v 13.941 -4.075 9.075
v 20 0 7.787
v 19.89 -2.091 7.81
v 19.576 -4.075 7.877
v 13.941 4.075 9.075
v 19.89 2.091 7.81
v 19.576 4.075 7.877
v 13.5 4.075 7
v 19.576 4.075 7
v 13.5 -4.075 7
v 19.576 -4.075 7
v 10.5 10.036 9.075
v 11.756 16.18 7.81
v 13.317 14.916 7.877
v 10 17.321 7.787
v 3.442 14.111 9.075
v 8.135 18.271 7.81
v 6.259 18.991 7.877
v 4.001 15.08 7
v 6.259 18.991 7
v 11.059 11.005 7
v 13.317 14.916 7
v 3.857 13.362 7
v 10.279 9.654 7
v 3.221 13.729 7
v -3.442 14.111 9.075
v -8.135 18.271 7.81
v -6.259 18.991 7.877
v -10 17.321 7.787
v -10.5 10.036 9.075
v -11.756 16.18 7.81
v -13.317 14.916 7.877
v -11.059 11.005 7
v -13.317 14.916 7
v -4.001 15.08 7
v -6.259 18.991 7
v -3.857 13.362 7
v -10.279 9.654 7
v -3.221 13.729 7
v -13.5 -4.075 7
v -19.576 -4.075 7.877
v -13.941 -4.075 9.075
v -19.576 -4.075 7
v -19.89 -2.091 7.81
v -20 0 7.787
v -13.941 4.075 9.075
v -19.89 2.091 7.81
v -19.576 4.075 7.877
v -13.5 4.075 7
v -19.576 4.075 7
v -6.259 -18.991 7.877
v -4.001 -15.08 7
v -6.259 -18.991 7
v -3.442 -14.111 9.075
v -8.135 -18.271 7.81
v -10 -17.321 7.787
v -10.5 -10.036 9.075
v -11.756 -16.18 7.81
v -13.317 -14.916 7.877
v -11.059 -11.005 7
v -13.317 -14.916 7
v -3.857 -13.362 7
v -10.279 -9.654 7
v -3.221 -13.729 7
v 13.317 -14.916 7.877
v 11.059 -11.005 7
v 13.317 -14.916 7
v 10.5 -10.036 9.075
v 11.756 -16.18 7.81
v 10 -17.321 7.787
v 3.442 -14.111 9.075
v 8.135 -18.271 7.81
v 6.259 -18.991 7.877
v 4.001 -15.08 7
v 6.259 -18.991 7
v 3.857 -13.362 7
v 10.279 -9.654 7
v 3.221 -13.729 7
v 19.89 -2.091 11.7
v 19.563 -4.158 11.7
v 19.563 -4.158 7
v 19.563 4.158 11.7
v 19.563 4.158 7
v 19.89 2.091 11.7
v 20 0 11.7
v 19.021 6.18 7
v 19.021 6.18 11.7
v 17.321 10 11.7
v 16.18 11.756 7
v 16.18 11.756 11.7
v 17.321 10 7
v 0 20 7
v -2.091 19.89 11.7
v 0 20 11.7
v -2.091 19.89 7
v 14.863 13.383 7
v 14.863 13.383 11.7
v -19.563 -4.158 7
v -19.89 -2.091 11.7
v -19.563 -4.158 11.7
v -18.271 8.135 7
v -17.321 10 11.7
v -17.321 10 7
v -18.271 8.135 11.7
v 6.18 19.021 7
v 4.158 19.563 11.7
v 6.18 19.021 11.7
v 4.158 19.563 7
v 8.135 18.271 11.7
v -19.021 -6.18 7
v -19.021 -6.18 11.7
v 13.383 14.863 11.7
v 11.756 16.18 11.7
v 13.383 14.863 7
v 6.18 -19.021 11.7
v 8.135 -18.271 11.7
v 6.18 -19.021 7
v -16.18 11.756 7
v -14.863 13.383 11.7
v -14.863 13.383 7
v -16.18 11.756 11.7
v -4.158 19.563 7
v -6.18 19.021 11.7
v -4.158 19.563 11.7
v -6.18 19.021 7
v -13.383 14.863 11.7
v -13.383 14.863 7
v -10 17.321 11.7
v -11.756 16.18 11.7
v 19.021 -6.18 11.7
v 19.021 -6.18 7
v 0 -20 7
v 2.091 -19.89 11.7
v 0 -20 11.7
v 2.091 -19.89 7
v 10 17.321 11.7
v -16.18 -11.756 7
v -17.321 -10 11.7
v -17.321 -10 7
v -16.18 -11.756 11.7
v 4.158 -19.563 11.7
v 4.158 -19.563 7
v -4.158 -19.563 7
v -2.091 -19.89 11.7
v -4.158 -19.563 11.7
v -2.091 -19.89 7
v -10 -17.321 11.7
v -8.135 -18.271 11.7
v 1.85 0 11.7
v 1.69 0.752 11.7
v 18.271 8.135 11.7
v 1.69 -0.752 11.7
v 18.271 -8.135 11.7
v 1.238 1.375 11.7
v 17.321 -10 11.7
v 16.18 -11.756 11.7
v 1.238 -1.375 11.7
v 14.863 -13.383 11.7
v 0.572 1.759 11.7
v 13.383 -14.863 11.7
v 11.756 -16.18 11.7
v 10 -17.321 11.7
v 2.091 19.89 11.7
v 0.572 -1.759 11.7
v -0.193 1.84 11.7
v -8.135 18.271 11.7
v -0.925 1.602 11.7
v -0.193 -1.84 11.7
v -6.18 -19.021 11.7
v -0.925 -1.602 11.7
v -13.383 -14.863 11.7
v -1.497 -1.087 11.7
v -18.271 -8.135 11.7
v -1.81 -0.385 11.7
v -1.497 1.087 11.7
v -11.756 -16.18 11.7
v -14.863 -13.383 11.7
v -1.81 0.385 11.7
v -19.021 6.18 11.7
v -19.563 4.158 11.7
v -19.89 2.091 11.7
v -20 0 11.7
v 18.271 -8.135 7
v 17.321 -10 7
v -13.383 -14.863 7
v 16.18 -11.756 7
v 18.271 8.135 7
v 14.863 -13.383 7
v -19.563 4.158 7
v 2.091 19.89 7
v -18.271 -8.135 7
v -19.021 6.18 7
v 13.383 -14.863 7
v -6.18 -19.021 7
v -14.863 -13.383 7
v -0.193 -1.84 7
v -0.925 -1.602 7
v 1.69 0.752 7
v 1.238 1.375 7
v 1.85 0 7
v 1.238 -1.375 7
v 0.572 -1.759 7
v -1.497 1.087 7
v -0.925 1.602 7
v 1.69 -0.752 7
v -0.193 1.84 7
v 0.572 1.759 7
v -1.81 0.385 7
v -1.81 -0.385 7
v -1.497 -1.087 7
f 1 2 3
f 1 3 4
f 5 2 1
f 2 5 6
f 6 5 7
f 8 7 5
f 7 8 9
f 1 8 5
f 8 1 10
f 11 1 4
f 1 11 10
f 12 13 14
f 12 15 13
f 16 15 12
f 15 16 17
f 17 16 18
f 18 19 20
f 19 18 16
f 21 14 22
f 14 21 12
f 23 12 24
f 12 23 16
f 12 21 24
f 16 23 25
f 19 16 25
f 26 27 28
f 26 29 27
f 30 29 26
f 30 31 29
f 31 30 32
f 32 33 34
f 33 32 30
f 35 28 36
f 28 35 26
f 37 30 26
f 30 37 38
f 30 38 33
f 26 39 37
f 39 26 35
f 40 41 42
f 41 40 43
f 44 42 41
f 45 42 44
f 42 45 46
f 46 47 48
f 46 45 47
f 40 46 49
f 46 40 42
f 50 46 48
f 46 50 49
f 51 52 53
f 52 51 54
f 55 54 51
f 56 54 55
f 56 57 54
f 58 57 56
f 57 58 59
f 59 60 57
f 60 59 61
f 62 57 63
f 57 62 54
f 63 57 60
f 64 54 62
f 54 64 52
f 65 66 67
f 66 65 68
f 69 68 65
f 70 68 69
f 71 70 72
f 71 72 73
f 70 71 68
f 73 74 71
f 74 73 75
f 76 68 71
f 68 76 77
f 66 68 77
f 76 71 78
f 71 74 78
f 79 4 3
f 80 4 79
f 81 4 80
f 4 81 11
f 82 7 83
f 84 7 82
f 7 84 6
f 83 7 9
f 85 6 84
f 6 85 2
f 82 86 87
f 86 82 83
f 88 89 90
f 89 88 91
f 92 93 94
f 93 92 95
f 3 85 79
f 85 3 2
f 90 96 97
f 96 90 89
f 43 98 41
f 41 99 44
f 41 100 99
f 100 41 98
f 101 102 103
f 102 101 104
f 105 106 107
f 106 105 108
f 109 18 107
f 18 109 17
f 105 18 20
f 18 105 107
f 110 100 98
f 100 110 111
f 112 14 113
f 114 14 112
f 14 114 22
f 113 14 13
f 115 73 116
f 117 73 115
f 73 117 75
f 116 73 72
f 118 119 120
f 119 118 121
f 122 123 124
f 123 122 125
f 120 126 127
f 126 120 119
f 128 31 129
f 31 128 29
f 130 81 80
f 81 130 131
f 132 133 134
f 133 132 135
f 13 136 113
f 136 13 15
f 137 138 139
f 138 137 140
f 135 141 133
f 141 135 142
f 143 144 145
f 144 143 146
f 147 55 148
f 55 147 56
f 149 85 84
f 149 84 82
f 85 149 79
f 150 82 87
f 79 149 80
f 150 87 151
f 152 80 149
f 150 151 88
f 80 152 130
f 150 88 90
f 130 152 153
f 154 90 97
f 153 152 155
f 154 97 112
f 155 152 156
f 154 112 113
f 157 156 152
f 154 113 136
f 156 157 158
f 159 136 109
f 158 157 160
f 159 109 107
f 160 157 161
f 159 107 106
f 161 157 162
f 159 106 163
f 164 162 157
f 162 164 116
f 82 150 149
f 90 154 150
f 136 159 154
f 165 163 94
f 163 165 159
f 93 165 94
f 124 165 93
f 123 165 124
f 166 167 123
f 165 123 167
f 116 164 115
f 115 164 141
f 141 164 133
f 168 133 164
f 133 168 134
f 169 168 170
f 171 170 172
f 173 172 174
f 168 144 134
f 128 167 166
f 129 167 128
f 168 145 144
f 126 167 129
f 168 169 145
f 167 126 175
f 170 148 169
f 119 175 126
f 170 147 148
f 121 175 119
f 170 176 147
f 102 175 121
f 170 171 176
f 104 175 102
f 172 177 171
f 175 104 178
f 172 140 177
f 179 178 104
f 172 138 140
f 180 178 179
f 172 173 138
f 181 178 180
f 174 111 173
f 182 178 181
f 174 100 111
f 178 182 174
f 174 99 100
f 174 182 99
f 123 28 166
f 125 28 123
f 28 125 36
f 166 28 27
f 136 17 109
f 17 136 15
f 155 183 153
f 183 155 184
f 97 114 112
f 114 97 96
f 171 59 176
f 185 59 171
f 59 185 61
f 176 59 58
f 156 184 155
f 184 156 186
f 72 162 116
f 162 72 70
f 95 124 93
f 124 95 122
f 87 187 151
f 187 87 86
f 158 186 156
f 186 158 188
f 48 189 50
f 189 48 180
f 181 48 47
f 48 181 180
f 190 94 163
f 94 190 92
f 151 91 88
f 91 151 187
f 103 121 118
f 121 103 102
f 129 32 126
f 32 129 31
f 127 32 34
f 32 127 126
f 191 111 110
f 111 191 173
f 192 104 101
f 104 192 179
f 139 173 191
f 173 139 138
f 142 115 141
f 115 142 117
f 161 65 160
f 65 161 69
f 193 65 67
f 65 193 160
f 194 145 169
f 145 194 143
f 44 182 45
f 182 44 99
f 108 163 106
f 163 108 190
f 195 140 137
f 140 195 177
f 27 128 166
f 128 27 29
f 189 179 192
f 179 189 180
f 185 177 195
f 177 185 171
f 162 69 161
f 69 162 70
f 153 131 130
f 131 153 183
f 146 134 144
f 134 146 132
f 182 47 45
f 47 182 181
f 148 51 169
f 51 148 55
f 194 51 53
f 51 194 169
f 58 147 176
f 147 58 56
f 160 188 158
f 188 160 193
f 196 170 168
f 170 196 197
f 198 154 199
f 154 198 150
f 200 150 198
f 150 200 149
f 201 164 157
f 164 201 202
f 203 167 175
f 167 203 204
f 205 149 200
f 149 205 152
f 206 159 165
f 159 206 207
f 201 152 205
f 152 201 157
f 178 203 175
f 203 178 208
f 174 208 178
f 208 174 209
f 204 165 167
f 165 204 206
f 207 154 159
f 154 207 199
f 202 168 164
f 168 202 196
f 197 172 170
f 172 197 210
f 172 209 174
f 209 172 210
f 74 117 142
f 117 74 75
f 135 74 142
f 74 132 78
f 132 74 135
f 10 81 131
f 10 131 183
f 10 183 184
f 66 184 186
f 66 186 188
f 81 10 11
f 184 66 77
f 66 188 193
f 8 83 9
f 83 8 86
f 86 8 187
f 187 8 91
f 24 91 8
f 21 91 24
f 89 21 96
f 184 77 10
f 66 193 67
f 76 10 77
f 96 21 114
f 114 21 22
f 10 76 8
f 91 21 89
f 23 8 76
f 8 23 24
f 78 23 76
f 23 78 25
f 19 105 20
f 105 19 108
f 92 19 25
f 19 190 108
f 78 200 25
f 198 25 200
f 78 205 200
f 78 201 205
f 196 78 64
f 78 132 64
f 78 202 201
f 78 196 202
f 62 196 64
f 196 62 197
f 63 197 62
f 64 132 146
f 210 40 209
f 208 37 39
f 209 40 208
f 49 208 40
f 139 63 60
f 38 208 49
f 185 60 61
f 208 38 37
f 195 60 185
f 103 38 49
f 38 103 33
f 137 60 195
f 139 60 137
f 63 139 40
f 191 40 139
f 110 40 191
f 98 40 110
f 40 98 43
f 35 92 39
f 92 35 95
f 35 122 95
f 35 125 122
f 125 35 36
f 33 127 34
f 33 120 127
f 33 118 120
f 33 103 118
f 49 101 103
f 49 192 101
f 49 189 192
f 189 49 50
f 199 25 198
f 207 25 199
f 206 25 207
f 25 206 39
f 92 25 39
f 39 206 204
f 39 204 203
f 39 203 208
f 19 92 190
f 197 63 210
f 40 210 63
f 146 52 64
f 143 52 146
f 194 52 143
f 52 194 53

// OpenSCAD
angle=12;
offset=-2.3;

//difference(){
//translate([0,0,offset])cylinder(d=40,h=30,$fn=60,center=true);
//cylinder(d=3.7,h=60,$fn=15,center=true);
//for(i=[0:60:330]){
//rotate([0,0,i])
//rotate([0,angle,0])translate([21.75,0,0])
//cube([20,8.15,23.55],center=true);
//}
//translate([0,0,-12])cylinder(d=50,h=30);
//}
//difference(){
//translate([0,0,-17.3])cylinder(d=10,h=12,$fn=30);
//cylinder(d=3,h=100,$fn=12,center=true);
//}

difference(){
translate([0,0,offset])cylinder(d=40,h=28,$fn=60,center=true);
cylinder(d=3.7,h=60,$fn=15,center=true);
for(i=[0:60:330]){
rotate([0,0,i])
rotate([0,angle,0])translate([21.75,0,0])
cube([20,8.15,23.55],center=true);
}
translate([0,0,-23])cylinder(d=50,h=30);
}

%rotate([0,angle,0])translate([21.75,0,0])
cube([20,8.15,23.55],center=true);
